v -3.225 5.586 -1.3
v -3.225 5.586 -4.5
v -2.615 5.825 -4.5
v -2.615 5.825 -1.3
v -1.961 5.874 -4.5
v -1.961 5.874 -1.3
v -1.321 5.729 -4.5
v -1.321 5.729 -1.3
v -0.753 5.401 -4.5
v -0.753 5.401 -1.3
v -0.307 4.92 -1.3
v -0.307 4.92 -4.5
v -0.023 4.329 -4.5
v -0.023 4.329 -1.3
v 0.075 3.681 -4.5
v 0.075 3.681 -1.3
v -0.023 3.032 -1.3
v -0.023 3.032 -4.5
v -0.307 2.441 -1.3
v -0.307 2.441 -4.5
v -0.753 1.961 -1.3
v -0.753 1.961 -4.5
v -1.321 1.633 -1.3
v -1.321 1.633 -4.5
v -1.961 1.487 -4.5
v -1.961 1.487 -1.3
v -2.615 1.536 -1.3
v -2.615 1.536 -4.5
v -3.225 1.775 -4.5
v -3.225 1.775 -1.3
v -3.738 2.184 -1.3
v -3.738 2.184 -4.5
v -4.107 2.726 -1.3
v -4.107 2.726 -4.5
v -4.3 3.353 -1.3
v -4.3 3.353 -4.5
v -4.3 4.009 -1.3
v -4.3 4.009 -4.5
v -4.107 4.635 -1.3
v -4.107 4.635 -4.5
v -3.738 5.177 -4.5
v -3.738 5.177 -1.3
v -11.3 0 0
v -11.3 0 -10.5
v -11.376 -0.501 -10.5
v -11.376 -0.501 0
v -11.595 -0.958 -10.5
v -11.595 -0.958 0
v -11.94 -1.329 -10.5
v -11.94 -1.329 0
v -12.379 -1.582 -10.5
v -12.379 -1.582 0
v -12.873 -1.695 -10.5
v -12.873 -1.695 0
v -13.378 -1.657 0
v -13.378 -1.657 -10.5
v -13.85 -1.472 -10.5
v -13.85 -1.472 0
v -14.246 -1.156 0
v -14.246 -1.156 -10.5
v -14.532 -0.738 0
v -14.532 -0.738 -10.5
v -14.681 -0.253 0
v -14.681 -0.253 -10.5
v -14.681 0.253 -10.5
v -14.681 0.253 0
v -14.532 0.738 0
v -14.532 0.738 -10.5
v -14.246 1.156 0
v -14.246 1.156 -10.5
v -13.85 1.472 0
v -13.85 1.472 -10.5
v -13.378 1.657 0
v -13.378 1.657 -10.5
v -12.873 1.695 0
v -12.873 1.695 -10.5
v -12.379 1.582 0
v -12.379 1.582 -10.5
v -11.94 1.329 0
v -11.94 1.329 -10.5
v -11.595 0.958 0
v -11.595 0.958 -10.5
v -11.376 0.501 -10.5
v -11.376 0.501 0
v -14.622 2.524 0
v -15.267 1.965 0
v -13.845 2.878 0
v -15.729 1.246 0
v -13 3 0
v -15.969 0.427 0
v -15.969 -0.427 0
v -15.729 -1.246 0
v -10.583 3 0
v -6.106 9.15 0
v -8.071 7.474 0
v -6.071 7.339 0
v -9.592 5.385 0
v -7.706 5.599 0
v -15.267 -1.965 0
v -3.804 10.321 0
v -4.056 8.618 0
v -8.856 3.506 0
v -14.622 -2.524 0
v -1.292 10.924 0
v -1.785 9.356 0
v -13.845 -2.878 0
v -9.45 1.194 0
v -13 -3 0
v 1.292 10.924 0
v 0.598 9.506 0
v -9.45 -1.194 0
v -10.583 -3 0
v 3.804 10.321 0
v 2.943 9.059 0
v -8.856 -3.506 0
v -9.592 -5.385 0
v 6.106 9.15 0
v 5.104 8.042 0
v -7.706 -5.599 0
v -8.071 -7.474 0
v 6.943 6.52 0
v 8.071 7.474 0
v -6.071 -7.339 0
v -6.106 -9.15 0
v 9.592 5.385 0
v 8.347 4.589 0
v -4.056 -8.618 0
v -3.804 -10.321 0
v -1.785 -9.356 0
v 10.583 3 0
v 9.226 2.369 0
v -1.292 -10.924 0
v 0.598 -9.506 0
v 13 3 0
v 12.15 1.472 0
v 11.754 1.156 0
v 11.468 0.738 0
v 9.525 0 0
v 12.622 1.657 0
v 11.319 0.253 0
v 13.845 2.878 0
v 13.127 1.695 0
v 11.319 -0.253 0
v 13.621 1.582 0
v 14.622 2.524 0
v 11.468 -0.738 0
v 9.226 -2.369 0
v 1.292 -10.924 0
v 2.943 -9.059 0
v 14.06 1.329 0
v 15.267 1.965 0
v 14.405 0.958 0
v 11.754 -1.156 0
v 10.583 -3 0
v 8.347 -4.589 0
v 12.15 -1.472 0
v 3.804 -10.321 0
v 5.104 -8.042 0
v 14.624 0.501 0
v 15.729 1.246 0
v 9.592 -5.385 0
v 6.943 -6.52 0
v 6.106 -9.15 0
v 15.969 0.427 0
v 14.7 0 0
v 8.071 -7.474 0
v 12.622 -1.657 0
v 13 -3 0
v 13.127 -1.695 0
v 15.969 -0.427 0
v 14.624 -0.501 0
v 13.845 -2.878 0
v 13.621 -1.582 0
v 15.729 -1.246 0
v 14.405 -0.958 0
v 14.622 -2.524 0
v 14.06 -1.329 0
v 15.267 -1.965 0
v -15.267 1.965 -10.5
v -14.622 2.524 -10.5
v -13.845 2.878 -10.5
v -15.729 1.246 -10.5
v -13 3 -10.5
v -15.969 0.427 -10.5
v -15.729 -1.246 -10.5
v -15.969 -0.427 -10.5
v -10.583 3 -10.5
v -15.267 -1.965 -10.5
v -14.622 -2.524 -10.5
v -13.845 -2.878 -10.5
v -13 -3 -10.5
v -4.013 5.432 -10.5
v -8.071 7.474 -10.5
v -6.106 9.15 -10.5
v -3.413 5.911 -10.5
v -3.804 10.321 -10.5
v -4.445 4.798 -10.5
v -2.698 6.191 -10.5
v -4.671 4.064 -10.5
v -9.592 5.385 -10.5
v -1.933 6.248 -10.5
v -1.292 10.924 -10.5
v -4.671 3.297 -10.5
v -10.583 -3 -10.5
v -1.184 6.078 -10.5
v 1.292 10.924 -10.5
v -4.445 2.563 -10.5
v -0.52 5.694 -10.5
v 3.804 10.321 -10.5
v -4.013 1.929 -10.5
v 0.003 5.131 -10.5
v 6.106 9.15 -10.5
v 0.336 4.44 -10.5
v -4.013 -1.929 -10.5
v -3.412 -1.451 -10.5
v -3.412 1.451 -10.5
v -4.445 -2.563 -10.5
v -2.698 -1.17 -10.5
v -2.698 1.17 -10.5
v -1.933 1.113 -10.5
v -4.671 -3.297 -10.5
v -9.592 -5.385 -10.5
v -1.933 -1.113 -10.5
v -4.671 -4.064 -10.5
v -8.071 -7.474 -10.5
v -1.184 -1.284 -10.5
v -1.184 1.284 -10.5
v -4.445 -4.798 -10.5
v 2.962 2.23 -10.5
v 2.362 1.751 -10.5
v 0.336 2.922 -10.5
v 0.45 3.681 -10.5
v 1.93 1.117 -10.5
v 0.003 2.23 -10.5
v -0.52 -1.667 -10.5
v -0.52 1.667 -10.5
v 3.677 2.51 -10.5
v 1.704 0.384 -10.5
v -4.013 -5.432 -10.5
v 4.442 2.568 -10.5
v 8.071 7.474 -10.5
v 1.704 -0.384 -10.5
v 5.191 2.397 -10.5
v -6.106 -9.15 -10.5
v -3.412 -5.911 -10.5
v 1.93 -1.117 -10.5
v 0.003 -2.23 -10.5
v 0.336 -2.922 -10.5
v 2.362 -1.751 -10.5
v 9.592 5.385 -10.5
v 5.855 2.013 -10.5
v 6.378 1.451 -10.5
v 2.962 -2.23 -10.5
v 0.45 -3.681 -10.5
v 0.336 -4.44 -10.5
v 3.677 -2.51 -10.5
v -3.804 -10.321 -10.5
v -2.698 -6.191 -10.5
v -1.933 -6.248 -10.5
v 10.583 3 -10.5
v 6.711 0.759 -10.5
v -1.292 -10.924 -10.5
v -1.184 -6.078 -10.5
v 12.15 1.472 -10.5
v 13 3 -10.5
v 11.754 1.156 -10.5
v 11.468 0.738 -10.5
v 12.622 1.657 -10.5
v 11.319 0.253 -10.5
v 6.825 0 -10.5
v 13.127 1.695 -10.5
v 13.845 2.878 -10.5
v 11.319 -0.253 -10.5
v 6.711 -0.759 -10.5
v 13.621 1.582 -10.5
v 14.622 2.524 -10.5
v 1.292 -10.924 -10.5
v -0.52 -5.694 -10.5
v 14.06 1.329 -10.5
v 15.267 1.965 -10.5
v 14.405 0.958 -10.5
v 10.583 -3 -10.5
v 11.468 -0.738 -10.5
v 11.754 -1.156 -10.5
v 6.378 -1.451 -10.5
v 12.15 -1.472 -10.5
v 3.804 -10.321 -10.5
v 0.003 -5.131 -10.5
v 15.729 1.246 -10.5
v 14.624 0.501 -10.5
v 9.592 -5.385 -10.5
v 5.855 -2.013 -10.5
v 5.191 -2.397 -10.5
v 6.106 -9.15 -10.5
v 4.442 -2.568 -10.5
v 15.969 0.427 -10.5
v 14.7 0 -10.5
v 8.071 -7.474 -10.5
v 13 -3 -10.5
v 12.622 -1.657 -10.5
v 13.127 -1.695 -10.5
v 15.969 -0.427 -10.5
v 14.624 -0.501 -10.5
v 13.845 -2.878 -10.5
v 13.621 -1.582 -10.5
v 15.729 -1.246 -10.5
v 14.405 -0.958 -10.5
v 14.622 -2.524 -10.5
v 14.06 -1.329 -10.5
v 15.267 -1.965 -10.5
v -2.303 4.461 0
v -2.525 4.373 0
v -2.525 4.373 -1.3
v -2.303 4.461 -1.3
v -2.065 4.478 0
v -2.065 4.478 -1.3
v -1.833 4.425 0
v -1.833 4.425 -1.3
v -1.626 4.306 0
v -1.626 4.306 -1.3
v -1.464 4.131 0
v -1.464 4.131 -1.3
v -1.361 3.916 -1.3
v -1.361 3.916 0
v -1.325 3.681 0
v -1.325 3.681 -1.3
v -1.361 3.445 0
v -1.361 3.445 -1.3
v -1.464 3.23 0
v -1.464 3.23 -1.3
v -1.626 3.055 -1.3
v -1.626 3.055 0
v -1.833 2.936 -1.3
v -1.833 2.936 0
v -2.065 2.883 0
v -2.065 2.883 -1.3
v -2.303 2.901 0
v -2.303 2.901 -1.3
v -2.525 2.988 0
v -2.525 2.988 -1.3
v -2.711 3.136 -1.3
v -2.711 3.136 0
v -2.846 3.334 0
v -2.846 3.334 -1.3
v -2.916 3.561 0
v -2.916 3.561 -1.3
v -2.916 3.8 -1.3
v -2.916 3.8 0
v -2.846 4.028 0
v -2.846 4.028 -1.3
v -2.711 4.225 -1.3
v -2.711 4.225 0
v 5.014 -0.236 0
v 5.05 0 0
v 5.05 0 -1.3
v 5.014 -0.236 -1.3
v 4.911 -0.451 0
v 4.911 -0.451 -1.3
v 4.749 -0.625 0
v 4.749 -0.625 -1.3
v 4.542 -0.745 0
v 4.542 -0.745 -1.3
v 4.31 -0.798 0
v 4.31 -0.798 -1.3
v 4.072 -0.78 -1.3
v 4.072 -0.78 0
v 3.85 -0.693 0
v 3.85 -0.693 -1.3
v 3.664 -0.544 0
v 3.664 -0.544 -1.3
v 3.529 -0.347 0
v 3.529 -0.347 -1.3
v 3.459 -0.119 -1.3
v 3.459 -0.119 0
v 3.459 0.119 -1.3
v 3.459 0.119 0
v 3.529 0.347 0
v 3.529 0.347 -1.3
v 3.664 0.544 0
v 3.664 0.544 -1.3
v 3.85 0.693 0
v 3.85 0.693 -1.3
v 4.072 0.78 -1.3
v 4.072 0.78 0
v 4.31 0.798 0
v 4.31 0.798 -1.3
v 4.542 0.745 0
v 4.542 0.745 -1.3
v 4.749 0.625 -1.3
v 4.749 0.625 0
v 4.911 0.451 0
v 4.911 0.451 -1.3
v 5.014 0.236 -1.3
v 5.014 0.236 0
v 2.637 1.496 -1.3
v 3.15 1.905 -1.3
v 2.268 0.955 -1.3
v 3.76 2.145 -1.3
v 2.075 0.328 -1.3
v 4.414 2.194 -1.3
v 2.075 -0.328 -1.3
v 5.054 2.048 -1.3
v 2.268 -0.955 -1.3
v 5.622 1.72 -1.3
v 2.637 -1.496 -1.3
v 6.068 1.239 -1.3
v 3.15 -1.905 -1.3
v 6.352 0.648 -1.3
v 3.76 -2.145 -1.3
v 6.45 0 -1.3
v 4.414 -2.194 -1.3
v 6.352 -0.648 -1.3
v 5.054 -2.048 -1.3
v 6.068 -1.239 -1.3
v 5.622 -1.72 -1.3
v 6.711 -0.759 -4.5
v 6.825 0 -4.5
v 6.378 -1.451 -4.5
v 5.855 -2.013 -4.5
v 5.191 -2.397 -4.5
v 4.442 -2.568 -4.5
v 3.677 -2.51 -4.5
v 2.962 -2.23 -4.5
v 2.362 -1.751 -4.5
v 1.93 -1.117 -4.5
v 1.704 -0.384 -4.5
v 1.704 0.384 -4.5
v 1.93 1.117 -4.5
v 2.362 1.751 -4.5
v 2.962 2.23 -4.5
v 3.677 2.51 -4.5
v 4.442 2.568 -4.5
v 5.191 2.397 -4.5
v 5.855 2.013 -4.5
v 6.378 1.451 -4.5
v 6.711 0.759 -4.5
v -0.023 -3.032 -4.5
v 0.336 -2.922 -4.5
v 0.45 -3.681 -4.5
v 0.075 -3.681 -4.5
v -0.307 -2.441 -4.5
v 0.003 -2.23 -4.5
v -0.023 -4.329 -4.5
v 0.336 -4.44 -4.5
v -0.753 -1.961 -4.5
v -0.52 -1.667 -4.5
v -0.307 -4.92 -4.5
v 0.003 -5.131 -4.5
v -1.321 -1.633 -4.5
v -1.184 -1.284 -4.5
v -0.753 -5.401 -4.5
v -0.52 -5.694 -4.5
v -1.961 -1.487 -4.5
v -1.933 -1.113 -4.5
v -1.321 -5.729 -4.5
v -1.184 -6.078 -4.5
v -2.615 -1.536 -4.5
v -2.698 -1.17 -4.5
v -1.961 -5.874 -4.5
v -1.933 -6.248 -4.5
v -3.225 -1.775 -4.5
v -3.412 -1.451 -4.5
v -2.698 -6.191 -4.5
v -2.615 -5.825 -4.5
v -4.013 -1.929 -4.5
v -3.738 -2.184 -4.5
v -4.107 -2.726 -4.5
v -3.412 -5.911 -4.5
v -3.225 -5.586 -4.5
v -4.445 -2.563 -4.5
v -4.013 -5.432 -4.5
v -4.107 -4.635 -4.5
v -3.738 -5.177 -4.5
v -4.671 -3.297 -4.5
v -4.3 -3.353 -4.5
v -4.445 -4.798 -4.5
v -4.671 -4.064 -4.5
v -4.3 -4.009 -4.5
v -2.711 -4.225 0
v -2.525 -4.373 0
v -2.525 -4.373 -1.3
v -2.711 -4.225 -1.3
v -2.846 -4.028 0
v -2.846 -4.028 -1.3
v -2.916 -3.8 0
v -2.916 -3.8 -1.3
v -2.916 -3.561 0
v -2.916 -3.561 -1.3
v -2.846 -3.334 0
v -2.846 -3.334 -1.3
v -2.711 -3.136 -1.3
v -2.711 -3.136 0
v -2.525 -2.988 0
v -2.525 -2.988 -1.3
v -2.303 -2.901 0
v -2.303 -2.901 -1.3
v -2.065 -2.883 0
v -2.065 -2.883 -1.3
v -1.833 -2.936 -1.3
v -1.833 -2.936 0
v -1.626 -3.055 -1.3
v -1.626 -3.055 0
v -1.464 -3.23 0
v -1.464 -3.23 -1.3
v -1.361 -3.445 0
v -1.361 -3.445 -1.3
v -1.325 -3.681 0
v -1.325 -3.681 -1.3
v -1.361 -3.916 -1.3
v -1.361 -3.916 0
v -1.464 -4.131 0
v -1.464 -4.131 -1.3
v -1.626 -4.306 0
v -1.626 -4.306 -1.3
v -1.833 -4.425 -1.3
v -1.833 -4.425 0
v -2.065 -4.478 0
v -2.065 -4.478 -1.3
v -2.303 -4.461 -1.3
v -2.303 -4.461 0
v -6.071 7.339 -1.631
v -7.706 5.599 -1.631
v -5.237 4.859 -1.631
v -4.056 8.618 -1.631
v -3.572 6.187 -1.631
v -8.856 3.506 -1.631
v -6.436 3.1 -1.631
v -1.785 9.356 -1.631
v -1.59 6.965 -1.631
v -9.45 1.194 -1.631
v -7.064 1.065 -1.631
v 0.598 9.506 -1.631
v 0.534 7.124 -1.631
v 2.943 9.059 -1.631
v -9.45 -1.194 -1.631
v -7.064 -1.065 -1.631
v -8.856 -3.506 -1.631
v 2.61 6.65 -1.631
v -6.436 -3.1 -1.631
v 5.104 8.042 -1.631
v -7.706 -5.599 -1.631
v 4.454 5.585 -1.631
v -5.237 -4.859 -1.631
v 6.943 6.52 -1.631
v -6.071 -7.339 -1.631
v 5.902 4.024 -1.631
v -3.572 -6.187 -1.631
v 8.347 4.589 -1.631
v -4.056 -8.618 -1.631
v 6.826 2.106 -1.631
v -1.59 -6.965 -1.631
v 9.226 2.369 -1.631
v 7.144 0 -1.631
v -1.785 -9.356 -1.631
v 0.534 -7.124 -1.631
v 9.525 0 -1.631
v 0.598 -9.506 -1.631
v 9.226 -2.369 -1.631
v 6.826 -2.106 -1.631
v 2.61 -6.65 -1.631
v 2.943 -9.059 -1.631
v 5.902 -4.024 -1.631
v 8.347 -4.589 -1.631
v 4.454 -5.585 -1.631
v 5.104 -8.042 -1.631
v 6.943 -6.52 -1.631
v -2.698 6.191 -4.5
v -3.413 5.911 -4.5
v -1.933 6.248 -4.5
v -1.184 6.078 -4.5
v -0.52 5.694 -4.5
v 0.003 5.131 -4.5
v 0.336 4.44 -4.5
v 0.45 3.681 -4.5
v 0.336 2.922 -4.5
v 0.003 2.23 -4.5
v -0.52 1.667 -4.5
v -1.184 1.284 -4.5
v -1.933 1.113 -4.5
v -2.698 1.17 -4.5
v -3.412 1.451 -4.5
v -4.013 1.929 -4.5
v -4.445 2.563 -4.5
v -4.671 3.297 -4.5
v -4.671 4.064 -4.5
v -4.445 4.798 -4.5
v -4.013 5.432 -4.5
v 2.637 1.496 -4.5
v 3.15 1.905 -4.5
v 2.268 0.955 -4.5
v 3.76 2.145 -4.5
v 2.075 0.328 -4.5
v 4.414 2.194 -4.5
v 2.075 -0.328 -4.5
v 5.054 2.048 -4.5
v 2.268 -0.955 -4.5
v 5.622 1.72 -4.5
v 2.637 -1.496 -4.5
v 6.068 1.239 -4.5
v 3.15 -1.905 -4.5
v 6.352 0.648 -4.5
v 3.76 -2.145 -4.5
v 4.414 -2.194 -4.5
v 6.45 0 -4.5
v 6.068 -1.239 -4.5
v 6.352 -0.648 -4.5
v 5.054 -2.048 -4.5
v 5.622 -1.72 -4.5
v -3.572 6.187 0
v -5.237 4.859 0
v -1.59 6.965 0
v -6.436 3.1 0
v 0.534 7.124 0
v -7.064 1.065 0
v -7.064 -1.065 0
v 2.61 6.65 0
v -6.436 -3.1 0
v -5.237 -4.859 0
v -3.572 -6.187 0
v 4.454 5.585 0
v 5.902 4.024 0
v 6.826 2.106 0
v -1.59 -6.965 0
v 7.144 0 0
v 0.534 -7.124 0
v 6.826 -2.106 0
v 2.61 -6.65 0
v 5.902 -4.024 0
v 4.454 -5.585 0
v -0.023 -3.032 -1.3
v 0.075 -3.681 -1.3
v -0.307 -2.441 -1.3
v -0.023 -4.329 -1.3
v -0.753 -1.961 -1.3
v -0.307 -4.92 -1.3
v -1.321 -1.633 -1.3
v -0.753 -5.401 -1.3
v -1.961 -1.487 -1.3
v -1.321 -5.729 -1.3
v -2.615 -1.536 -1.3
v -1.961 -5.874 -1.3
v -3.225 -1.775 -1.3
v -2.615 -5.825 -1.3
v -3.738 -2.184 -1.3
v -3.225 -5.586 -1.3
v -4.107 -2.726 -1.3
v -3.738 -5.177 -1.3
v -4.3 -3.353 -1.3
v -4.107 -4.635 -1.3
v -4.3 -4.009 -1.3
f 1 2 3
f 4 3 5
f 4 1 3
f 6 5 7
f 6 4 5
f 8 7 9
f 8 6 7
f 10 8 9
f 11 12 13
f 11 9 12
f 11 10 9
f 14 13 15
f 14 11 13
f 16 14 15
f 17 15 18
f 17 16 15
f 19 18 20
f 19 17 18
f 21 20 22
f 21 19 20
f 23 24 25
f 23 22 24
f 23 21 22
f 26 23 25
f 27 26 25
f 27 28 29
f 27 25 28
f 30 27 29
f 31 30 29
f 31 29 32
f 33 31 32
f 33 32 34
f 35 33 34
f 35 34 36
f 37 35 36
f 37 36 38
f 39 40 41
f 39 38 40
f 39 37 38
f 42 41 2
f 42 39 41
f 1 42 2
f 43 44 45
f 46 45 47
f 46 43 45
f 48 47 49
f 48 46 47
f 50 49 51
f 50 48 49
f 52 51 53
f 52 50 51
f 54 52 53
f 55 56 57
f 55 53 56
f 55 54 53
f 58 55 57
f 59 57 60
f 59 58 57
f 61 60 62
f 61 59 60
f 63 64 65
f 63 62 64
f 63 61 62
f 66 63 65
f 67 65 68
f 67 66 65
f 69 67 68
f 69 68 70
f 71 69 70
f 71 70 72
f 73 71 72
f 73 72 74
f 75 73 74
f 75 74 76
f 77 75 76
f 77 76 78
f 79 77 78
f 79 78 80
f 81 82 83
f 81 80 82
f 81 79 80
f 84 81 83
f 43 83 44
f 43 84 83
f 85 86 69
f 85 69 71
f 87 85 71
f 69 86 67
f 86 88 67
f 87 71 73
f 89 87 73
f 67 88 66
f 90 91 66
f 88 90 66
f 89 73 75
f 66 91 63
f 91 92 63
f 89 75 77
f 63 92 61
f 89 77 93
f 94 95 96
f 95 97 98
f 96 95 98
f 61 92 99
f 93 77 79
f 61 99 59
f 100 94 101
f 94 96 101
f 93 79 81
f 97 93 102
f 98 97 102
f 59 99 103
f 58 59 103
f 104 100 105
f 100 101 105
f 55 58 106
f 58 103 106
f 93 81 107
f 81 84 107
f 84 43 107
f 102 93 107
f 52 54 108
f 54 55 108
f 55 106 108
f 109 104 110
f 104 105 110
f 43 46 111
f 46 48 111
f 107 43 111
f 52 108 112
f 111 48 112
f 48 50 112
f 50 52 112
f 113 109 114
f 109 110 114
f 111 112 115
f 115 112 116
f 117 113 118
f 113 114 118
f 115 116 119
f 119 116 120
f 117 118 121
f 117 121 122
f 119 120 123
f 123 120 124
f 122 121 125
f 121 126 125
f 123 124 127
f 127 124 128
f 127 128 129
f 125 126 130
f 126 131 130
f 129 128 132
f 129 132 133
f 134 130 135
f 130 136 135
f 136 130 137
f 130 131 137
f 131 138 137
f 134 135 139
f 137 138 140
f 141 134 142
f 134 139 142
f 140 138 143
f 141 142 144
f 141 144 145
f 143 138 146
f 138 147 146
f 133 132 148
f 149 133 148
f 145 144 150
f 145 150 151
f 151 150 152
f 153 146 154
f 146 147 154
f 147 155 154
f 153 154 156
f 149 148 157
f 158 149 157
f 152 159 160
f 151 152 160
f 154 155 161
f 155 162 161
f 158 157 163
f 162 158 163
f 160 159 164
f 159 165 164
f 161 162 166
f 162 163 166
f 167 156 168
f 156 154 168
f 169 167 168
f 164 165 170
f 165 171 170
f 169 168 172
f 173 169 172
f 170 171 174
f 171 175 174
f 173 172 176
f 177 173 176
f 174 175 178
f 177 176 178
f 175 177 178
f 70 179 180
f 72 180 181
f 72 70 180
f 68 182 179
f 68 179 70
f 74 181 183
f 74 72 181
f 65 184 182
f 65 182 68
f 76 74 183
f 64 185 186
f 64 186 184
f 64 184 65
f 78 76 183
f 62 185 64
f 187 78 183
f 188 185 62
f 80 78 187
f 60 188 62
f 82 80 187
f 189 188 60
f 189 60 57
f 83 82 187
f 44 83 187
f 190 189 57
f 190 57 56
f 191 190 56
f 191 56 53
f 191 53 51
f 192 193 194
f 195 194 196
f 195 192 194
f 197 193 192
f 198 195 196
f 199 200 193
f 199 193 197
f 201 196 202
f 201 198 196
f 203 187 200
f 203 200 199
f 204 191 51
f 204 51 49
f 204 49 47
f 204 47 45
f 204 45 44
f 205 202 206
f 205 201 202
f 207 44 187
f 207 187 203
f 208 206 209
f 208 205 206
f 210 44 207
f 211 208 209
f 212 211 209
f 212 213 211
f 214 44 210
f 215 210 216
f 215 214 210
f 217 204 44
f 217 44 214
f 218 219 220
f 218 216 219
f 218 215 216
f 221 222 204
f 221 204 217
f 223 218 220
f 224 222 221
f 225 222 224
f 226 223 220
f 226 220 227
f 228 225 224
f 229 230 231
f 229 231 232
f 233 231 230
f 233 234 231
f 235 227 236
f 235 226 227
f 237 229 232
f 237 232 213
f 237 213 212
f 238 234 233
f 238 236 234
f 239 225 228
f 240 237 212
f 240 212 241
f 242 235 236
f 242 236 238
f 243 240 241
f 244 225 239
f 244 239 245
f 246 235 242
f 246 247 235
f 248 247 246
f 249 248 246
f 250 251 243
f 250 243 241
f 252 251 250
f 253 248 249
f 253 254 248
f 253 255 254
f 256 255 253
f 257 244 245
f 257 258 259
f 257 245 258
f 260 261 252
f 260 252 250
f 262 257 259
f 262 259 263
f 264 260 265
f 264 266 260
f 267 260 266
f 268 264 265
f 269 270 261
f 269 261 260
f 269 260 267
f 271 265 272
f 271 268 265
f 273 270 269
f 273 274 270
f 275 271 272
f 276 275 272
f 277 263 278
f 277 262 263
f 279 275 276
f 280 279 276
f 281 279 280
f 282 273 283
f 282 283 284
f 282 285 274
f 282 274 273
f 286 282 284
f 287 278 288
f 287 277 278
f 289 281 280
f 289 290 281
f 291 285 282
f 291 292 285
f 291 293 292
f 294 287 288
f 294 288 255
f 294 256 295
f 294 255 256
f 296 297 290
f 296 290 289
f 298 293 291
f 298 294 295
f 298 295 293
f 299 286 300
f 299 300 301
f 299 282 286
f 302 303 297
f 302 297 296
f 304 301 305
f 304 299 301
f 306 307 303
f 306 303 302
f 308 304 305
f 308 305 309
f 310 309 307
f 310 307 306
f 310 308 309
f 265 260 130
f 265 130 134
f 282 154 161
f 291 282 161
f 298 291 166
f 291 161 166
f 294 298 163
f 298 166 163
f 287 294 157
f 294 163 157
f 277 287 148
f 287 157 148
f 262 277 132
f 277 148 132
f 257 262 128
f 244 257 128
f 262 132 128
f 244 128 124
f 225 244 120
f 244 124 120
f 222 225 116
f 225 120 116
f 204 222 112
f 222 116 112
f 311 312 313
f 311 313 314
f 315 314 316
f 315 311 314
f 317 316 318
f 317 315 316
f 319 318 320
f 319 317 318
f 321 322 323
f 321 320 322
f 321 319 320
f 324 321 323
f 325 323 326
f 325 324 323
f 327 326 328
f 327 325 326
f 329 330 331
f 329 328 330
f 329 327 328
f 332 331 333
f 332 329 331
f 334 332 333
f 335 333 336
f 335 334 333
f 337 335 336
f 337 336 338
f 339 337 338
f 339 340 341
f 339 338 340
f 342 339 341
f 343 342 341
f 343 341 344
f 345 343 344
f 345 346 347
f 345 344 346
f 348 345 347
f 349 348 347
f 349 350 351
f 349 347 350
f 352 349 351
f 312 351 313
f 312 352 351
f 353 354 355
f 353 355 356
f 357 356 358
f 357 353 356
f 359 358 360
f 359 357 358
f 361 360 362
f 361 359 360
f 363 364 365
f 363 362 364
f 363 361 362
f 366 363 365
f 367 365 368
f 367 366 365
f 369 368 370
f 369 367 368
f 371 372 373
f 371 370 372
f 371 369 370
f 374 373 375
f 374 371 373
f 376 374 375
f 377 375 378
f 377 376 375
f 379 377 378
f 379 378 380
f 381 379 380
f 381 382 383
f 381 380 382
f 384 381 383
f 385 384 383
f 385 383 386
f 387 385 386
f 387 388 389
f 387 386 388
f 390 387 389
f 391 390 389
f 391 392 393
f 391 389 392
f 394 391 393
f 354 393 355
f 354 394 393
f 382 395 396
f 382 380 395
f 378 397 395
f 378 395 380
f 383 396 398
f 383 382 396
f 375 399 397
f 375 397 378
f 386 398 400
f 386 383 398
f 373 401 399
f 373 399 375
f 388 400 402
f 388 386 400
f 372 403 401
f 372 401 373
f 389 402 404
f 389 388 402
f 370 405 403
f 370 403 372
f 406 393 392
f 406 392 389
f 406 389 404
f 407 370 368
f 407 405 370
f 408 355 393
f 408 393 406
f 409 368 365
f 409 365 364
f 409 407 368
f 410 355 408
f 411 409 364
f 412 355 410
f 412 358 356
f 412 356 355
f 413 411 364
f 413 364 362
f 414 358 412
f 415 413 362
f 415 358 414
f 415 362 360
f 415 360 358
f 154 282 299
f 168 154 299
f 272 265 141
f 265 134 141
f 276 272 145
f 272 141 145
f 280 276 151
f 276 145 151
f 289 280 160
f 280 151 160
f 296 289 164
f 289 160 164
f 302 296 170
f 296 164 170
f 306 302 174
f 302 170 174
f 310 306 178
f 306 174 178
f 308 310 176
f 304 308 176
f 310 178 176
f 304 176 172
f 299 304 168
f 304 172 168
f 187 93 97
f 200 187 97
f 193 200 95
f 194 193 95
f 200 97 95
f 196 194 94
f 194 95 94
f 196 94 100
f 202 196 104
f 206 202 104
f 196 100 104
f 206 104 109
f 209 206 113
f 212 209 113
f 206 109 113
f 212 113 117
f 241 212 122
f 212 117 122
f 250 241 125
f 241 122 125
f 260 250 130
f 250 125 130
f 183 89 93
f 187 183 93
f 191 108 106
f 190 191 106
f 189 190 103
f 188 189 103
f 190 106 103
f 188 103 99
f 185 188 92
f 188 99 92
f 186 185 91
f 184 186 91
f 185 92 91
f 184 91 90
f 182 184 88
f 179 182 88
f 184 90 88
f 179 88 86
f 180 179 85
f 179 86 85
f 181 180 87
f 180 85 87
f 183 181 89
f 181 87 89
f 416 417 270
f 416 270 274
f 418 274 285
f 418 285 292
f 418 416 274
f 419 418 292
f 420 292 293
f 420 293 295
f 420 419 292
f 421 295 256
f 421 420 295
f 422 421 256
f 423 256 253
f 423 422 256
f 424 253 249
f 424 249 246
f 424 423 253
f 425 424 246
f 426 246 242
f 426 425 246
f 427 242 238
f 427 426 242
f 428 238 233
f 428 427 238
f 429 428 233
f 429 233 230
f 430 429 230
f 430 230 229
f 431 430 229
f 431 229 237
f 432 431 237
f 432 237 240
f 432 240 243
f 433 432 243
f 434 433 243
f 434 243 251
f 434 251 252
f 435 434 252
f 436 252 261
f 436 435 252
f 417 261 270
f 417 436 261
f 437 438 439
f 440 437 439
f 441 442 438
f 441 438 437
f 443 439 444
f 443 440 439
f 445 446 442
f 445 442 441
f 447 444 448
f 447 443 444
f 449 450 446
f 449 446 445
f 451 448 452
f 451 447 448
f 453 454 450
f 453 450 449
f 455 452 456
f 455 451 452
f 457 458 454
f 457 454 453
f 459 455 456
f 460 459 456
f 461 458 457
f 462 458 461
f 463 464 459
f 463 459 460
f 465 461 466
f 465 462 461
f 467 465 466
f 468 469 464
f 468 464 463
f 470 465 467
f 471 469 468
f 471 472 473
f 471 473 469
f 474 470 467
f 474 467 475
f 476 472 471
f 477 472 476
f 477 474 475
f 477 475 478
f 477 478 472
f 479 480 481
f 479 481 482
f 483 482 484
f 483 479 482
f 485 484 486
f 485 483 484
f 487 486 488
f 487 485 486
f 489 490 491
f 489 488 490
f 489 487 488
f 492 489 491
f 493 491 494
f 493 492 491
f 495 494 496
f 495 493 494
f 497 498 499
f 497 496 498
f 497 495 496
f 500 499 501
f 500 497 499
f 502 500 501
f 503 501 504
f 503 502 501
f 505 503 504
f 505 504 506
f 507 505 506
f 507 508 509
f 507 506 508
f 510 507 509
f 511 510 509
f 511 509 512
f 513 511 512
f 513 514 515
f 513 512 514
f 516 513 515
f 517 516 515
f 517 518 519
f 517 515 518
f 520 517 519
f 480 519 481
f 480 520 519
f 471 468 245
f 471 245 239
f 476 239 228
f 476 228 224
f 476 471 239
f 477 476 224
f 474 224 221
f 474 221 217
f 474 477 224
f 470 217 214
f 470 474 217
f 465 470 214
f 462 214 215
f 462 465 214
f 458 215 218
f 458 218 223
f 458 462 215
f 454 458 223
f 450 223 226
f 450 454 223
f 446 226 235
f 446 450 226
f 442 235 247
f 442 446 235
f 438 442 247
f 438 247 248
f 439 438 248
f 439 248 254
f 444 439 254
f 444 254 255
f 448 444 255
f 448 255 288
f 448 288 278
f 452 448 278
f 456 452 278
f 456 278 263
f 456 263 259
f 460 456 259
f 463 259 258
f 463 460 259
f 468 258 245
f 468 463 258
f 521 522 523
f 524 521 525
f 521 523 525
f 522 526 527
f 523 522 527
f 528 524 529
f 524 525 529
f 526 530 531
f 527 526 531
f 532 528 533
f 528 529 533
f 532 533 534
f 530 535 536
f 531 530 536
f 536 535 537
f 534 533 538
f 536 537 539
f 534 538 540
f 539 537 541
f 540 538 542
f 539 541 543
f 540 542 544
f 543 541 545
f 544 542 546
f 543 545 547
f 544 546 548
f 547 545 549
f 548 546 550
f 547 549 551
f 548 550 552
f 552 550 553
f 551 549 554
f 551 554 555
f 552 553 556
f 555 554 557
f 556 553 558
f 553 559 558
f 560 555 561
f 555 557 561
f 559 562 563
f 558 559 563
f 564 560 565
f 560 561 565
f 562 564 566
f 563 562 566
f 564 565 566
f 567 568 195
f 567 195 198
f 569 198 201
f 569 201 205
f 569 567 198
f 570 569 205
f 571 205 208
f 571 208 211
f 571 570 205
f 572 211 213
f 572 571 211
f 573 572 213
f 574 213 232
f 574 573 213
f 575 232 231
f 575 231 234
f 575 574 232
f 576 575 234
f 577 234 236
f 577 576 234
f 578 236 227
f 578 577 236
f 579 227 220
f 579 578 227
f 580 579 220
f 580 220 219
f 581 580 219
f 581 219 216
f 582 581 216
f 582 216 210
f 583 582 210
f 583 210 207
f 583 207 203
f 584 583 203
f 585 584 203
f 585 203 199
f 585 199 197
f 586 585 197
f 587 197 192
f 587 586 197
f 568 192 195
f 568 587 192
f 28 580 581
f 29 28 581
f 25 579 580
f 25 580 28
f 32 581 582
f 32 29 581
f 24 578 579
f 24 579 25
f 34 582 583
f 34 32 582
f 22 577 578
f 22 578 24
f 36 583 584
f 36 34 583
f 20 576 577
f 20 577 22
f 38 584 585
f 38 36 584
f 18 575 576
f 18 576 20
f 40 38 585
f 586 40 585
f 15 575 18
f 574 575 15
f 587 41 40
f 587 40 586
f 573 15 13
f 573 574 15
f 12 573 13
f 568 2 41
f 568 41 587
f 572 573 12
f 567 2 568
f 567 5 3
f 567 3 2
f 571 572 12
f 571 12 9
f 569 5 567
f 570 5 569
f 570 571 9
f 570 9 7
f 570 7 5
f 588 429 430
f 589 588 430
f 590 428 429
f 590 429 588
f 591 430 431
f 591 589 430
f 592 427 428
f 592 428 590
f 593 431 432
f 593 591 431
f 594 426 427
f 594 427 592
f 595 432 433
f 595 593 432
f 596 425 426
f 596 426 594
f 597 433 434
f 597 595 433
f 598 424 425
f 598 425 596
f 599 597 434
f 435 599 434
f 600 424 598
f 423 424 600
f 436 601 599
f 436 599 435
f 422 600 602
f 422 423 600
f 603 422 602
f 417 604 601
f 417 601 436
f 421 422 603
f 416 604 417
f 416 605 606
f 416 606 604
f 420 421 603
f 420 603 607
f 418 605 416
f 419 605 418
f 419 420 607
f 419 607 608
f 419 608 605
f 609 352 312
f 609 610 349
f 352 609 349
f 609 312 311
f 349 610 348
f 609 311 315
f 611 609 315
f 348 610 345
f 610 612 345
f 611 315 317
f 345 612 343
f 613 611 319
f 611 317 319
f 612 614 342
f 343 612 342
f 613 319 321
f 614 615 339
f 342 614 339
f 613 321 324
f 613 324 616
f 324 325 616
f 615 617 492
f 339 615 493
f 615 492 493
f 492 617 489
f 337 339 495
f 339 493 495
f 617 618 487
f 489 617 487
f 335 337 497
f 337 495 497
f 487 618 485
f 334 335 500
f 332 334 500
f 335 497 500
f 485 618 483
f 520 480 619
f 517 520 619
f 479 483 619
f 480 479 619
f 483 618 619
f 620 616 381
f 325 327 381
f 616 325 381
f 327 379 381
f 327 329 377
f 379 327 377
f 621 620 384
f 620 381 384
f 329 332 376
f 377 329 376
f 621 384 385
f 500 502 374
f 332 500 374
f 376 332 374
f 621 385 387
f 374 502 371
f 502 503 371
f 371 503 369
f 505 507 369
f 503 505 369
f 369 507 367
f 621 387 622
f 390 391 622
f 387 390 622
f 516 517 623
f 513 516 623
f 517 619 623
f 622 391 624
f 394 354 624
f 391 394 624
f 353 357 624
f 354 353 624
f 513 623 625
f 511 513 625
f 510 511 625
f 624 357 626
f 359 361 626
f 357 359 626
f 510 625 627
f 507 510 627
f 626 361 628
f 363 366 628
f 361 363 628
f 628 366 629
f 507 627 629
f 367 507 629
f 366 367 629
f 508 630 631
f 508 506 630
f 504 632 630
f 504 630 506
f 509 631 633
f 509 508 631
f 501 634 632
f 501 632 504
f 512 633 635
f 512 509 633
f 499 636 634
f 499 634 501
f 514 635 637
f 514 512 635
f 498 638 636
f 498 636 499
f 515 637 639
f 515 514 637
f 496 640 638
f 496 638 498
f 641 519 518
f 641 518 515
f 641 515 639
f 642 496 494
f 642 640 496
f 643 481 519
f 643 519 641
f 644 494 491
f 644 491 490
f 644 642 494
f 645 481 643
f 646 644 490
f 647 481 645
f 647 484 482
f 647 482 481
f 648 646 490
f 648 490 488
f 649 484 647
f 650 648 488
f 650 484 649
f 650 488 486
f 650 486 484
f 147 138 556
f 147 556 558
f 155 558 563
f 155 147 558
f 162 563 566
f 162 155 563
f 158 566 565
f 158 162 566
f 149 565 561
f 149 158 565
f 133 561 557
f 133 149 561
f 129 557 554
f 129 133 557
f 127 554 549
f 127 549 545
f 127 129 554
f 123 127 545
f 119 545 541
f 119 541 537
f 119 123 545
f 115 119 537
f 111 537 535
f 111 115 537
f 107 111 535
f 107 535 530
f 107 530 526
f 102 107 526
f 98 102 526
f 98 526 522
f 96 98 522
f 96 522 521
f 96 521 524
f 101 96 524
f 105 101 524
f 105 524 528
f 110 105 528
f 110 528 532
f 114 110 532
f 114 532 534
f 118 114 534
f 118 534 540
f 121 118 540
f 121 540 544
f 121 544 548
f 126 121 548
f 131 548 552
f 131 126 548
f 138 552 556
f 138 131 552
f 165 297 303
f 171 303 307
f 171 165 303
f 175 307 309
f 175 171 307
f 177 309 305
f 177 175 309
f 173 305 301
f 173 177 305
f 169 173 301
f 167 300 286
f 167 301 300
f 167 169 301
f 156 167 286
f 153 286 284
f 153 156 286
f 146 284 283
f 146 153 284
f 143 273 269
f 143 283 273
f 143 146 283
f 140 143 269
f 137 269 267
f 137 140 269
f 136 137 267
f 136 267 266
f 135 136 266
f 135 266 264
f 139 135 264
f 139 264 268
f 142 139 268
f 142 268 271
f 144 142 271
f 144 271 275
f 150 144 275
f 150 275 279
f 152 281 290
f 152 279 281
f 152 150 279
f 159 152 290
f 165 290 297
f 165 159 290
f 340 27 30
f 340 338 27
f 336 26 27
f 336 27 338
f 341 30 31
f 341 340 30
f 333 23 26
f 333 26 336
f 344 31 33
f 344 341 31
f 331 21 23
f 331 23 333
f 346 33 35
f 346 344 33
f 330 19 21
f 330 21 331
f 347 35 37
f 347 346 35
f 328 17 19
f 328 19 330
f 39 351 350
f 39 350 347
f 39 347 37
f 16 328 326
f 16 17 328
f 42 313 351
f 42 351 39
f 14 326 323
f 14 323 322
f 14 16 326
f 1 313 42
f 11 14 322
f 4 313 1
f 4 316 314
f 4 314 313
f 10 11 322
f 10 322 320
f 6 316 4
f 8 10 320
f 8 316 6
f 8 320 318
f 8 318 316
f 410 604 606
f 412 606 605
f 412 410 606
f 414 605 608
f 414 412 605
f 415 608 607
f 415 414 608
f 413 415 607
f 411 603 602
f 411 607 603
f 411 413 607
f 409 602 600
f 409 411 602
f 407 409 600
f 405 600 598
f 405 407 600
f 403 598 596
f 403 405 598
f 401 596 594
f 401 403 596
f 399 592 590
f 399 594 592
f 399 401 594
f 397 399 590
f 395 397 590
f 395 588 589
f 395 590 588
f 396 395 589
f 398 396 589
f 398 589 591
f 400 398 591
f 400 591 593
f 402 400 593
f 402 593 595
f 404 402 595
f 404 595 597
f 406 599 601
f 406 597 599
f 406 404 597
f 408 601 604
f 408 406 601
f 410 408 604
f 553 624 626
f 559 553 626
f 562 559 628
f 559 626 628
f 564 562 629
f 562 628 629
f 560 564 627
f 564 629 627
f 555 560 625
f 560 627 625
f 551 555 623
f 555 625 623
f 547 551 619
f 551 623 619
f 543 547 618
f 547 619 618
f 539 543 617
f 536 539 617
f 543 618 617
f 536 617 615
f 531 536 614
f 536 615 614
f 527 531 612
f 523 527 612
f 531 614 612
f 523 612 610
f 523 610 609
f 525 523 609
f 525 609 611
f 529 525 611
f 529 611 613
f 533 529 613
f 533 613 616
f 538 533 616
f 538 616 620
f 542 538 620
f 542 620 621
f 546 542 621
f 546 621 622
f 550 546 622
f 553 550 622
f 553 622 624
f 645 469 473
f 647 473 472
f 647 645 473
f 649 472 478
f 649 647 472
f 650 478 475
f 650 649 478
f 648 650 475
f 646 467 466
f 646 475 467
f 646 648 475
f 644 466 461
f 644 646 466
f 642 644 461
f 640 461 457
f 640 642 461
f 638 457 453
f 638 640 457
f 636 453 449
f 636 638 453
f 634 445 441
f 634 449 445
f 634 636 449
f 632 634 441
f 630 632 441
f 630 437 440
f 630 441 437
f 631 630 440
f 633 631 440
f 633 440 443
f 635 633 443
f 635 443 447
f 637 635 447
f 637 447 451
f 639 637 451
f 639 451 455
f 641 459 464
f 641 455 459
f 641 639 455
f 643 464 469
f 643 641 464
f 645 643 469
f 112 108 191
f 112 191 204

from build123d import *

# Parameters (mm, degrees)
CYLINDER150_R       = 1.7
CYLINDER150_DEPTH   = 11
CYLINDER154_R       = 7.14375
CYLINDER154_DEPTH   = 2.38125
CYLINDER155_R       = 9.525
CYLINDER155_DEPTH   = 2.38125
CYLINDER157_R       = 2.2
CYLINDER157_DEPTH   = 9
CYLINDER156_R       = 0.8
CYLINDER156_DEPTH   = 5
CYLINDER147_R       = 2.575
CYLINDER147_DEPTH   = 6
ARRAY_COUNT         = 3
CYLINDER151_R       = 1.7
CYLINDER151_DEPTH   = 11
BOX001_W            = 3
BOX001_H            = 6
BOX001_DEPTH        = 10.5
BOX_W               = 3
BOX_H               = 6
BOX_DEPTH           = 10.5
CYLINDER_R          = 3
CYLINDER_DEPTH      = 10.5
CYLINDER153_R       = 11
CYLINDER153_DEPTH   = 10.5
CYLINDER158_R       = 3
CYLINDER158_DEPTH   = 10.5
CUT_PLACEMENT_ANGLE = 180


with BuildPart() as wirefeedsmount1:
    # Cylinder150 → Cylinder150 (new body)
    with BuildSketch(Plane(origin=(-13, 0, 0), x_dir=(1, 0, 0), z_dir=(0, 0, 1))):
        Circle(CYLINDER150_R)
    extrude(amount=CYLINDER150_DEPTH)


with BuildPart() as cylinder008:
    # Cylinder154 → Cylinder154 (new body)
    with BuildSketch(Plane.XY):
        Circle(CYLINDER154_R)
    extrude(amount=CYLINDER154_DEPTH)


with BuildPart() as oring:
    # Cylinder155 → Cylinder155 (new body)
    with BuildSketch(Plane.XY):
        Circle(CYLINDER155_R)
    extrude(amount=CYLINDER155_DEPTH)

    # Cut019: cut Cylinder008
    add(cylinder008.part, mode=Mode.SUBTRACT)


with BuildPart() as oring_1:
    # Cut019 placement: moved
    add(oring.part.moved(Location((0, 0, -0.75))))


with BuildPart() as sealsubtraction:
    # Cylinder157 → Cylinder157 (new body)
    with BuildSketch(Plane.XY.offset(1.3)):
        Circle(CYLINDER157_R)
    extrude(amount=CYLINDER157_DEPTH)


with BuildPart() as bottomwireoutlet:
    # Cylinder156 → Cylinder156 (new body)
    with BuildSketch(Plane.XY.offset(-2)):
        Circle(CYLINDER156_R)
    extrude(amount=CYLINDER156_DEPTH)


with BuildPart() as sealarray:
    # Cylinder147 → Cylinder147 (new body)
    with BuildSketch(Plane.XY.offset(4.5)):
        Circle(CYLINDER147_R)
    extrude(amount=CYLINDER147_DEPTH)

    # Fusion: union SealSubtraction, BottomWireOutlet
    add(sealsubtraction.part)
    add(bottomwireoutlet.part)


with BuildPart() as sealarray_1:
    # Fusion placement: moved
    add(sealarray.part.moved(Location((4.25, 0, 0))))

    # Array: SealArray ×3 about axis
    array_axis = Axis((0, 0, 0), (0, 0, 1))


with BuildPart() as sealarray_2:
    add(sealarray_1.part)
    for i in range(1, ARRAY_COUNT):
        add(sealarray_1.part.rotate(array_axis, i * 360 / ARRAY_COUNT))


with BuildPart() as fusion002:
    # Cylinder151 → Cylinder151 (new body)
    with BuildSketch(Plane(origin=(13, 0, 0), x_dir=(1, 0, 0), z_dir=(0, 0, 1))):
        Circle(CYLINDER151_R)
    extrude(amount=CYLINDER151_DEPTH)

    # Fusion002: union WireFeedsMount1, Oring, SealArray
    add(wirefeedsmount1.part)
    add(oring_1.part)
    add(sealarray_2.part)


with BuildPart() as mountcube002:
    # Box001 → Box001 (new body)
    with BuildSketch(Plane(origin=(10, -3, 0), x_dir=(1, 0, 0), z_dir=(0, 0, 1))):
        with Locations((1.5, 3)):
            Rectangle(BOX001_W, BOX001_H)
    extrude(amount=BOX001_DEPTH)


with BuildPart() as mountcube1:
    # Box → Box (new body)
    with BuildSketch(Plane(origin=(-13, -3, 0), x_dir=(1, 0, 0), z_dir=(0, 0, 1))):
        with Locations((1.5, 3)):
            Rectangle(BOX_W, BOX_H)
    extrude(amount=BOX_DEPTH)


with BuildPart() as mountflange1:
    # Cylinder → Cylinder (new body)
    with BuildSketch(Plane(origin=(-13, 0, 0), x_dir=(1, 0, 0), z_dir=(0, 0, 1))):
        Circle(CYLINDER_R)
    extrude(amount=CYLINDER_DEPTH)


with BuildPart() as body:
    # Cylinder153 → Cylinder153 (new body)
    with BuildSketch(Plane.XY):
        Circle(CYLINDER153_R)
    extrude(amount=CYLINDER153_DEPTH)


with BuildPart() as cut:
    # Cylinder158 → Cylinder158 (new body)
    with BuildSketch(Plane(origin=(13, 0, 0), x_dir=(1, 0, 0), z_dir=(0, 0, 1))):
        Circle(CYLINDER158_R)
    extrude(amount=CYLINDER158_DEPTH)

    # Fusion001: union MountCube002, MountCube1, MountFlange1, Body
    add(mountcube002.part)
    add(mountcube1.part)
    add(mountflange1.part)
    add(body.part)

    # Cut: cut Fusion002
    add(fusion002.part, mode=Mode.SUBTRACT)


with BuildPart() as cut_1:
    # Cut placement: moved
    add(cut.part.rotate(Axis((0, 0, 0), (1, 0, 0)), CUT_PLACEMENT_ANGLE))


solid = cut_1.part
